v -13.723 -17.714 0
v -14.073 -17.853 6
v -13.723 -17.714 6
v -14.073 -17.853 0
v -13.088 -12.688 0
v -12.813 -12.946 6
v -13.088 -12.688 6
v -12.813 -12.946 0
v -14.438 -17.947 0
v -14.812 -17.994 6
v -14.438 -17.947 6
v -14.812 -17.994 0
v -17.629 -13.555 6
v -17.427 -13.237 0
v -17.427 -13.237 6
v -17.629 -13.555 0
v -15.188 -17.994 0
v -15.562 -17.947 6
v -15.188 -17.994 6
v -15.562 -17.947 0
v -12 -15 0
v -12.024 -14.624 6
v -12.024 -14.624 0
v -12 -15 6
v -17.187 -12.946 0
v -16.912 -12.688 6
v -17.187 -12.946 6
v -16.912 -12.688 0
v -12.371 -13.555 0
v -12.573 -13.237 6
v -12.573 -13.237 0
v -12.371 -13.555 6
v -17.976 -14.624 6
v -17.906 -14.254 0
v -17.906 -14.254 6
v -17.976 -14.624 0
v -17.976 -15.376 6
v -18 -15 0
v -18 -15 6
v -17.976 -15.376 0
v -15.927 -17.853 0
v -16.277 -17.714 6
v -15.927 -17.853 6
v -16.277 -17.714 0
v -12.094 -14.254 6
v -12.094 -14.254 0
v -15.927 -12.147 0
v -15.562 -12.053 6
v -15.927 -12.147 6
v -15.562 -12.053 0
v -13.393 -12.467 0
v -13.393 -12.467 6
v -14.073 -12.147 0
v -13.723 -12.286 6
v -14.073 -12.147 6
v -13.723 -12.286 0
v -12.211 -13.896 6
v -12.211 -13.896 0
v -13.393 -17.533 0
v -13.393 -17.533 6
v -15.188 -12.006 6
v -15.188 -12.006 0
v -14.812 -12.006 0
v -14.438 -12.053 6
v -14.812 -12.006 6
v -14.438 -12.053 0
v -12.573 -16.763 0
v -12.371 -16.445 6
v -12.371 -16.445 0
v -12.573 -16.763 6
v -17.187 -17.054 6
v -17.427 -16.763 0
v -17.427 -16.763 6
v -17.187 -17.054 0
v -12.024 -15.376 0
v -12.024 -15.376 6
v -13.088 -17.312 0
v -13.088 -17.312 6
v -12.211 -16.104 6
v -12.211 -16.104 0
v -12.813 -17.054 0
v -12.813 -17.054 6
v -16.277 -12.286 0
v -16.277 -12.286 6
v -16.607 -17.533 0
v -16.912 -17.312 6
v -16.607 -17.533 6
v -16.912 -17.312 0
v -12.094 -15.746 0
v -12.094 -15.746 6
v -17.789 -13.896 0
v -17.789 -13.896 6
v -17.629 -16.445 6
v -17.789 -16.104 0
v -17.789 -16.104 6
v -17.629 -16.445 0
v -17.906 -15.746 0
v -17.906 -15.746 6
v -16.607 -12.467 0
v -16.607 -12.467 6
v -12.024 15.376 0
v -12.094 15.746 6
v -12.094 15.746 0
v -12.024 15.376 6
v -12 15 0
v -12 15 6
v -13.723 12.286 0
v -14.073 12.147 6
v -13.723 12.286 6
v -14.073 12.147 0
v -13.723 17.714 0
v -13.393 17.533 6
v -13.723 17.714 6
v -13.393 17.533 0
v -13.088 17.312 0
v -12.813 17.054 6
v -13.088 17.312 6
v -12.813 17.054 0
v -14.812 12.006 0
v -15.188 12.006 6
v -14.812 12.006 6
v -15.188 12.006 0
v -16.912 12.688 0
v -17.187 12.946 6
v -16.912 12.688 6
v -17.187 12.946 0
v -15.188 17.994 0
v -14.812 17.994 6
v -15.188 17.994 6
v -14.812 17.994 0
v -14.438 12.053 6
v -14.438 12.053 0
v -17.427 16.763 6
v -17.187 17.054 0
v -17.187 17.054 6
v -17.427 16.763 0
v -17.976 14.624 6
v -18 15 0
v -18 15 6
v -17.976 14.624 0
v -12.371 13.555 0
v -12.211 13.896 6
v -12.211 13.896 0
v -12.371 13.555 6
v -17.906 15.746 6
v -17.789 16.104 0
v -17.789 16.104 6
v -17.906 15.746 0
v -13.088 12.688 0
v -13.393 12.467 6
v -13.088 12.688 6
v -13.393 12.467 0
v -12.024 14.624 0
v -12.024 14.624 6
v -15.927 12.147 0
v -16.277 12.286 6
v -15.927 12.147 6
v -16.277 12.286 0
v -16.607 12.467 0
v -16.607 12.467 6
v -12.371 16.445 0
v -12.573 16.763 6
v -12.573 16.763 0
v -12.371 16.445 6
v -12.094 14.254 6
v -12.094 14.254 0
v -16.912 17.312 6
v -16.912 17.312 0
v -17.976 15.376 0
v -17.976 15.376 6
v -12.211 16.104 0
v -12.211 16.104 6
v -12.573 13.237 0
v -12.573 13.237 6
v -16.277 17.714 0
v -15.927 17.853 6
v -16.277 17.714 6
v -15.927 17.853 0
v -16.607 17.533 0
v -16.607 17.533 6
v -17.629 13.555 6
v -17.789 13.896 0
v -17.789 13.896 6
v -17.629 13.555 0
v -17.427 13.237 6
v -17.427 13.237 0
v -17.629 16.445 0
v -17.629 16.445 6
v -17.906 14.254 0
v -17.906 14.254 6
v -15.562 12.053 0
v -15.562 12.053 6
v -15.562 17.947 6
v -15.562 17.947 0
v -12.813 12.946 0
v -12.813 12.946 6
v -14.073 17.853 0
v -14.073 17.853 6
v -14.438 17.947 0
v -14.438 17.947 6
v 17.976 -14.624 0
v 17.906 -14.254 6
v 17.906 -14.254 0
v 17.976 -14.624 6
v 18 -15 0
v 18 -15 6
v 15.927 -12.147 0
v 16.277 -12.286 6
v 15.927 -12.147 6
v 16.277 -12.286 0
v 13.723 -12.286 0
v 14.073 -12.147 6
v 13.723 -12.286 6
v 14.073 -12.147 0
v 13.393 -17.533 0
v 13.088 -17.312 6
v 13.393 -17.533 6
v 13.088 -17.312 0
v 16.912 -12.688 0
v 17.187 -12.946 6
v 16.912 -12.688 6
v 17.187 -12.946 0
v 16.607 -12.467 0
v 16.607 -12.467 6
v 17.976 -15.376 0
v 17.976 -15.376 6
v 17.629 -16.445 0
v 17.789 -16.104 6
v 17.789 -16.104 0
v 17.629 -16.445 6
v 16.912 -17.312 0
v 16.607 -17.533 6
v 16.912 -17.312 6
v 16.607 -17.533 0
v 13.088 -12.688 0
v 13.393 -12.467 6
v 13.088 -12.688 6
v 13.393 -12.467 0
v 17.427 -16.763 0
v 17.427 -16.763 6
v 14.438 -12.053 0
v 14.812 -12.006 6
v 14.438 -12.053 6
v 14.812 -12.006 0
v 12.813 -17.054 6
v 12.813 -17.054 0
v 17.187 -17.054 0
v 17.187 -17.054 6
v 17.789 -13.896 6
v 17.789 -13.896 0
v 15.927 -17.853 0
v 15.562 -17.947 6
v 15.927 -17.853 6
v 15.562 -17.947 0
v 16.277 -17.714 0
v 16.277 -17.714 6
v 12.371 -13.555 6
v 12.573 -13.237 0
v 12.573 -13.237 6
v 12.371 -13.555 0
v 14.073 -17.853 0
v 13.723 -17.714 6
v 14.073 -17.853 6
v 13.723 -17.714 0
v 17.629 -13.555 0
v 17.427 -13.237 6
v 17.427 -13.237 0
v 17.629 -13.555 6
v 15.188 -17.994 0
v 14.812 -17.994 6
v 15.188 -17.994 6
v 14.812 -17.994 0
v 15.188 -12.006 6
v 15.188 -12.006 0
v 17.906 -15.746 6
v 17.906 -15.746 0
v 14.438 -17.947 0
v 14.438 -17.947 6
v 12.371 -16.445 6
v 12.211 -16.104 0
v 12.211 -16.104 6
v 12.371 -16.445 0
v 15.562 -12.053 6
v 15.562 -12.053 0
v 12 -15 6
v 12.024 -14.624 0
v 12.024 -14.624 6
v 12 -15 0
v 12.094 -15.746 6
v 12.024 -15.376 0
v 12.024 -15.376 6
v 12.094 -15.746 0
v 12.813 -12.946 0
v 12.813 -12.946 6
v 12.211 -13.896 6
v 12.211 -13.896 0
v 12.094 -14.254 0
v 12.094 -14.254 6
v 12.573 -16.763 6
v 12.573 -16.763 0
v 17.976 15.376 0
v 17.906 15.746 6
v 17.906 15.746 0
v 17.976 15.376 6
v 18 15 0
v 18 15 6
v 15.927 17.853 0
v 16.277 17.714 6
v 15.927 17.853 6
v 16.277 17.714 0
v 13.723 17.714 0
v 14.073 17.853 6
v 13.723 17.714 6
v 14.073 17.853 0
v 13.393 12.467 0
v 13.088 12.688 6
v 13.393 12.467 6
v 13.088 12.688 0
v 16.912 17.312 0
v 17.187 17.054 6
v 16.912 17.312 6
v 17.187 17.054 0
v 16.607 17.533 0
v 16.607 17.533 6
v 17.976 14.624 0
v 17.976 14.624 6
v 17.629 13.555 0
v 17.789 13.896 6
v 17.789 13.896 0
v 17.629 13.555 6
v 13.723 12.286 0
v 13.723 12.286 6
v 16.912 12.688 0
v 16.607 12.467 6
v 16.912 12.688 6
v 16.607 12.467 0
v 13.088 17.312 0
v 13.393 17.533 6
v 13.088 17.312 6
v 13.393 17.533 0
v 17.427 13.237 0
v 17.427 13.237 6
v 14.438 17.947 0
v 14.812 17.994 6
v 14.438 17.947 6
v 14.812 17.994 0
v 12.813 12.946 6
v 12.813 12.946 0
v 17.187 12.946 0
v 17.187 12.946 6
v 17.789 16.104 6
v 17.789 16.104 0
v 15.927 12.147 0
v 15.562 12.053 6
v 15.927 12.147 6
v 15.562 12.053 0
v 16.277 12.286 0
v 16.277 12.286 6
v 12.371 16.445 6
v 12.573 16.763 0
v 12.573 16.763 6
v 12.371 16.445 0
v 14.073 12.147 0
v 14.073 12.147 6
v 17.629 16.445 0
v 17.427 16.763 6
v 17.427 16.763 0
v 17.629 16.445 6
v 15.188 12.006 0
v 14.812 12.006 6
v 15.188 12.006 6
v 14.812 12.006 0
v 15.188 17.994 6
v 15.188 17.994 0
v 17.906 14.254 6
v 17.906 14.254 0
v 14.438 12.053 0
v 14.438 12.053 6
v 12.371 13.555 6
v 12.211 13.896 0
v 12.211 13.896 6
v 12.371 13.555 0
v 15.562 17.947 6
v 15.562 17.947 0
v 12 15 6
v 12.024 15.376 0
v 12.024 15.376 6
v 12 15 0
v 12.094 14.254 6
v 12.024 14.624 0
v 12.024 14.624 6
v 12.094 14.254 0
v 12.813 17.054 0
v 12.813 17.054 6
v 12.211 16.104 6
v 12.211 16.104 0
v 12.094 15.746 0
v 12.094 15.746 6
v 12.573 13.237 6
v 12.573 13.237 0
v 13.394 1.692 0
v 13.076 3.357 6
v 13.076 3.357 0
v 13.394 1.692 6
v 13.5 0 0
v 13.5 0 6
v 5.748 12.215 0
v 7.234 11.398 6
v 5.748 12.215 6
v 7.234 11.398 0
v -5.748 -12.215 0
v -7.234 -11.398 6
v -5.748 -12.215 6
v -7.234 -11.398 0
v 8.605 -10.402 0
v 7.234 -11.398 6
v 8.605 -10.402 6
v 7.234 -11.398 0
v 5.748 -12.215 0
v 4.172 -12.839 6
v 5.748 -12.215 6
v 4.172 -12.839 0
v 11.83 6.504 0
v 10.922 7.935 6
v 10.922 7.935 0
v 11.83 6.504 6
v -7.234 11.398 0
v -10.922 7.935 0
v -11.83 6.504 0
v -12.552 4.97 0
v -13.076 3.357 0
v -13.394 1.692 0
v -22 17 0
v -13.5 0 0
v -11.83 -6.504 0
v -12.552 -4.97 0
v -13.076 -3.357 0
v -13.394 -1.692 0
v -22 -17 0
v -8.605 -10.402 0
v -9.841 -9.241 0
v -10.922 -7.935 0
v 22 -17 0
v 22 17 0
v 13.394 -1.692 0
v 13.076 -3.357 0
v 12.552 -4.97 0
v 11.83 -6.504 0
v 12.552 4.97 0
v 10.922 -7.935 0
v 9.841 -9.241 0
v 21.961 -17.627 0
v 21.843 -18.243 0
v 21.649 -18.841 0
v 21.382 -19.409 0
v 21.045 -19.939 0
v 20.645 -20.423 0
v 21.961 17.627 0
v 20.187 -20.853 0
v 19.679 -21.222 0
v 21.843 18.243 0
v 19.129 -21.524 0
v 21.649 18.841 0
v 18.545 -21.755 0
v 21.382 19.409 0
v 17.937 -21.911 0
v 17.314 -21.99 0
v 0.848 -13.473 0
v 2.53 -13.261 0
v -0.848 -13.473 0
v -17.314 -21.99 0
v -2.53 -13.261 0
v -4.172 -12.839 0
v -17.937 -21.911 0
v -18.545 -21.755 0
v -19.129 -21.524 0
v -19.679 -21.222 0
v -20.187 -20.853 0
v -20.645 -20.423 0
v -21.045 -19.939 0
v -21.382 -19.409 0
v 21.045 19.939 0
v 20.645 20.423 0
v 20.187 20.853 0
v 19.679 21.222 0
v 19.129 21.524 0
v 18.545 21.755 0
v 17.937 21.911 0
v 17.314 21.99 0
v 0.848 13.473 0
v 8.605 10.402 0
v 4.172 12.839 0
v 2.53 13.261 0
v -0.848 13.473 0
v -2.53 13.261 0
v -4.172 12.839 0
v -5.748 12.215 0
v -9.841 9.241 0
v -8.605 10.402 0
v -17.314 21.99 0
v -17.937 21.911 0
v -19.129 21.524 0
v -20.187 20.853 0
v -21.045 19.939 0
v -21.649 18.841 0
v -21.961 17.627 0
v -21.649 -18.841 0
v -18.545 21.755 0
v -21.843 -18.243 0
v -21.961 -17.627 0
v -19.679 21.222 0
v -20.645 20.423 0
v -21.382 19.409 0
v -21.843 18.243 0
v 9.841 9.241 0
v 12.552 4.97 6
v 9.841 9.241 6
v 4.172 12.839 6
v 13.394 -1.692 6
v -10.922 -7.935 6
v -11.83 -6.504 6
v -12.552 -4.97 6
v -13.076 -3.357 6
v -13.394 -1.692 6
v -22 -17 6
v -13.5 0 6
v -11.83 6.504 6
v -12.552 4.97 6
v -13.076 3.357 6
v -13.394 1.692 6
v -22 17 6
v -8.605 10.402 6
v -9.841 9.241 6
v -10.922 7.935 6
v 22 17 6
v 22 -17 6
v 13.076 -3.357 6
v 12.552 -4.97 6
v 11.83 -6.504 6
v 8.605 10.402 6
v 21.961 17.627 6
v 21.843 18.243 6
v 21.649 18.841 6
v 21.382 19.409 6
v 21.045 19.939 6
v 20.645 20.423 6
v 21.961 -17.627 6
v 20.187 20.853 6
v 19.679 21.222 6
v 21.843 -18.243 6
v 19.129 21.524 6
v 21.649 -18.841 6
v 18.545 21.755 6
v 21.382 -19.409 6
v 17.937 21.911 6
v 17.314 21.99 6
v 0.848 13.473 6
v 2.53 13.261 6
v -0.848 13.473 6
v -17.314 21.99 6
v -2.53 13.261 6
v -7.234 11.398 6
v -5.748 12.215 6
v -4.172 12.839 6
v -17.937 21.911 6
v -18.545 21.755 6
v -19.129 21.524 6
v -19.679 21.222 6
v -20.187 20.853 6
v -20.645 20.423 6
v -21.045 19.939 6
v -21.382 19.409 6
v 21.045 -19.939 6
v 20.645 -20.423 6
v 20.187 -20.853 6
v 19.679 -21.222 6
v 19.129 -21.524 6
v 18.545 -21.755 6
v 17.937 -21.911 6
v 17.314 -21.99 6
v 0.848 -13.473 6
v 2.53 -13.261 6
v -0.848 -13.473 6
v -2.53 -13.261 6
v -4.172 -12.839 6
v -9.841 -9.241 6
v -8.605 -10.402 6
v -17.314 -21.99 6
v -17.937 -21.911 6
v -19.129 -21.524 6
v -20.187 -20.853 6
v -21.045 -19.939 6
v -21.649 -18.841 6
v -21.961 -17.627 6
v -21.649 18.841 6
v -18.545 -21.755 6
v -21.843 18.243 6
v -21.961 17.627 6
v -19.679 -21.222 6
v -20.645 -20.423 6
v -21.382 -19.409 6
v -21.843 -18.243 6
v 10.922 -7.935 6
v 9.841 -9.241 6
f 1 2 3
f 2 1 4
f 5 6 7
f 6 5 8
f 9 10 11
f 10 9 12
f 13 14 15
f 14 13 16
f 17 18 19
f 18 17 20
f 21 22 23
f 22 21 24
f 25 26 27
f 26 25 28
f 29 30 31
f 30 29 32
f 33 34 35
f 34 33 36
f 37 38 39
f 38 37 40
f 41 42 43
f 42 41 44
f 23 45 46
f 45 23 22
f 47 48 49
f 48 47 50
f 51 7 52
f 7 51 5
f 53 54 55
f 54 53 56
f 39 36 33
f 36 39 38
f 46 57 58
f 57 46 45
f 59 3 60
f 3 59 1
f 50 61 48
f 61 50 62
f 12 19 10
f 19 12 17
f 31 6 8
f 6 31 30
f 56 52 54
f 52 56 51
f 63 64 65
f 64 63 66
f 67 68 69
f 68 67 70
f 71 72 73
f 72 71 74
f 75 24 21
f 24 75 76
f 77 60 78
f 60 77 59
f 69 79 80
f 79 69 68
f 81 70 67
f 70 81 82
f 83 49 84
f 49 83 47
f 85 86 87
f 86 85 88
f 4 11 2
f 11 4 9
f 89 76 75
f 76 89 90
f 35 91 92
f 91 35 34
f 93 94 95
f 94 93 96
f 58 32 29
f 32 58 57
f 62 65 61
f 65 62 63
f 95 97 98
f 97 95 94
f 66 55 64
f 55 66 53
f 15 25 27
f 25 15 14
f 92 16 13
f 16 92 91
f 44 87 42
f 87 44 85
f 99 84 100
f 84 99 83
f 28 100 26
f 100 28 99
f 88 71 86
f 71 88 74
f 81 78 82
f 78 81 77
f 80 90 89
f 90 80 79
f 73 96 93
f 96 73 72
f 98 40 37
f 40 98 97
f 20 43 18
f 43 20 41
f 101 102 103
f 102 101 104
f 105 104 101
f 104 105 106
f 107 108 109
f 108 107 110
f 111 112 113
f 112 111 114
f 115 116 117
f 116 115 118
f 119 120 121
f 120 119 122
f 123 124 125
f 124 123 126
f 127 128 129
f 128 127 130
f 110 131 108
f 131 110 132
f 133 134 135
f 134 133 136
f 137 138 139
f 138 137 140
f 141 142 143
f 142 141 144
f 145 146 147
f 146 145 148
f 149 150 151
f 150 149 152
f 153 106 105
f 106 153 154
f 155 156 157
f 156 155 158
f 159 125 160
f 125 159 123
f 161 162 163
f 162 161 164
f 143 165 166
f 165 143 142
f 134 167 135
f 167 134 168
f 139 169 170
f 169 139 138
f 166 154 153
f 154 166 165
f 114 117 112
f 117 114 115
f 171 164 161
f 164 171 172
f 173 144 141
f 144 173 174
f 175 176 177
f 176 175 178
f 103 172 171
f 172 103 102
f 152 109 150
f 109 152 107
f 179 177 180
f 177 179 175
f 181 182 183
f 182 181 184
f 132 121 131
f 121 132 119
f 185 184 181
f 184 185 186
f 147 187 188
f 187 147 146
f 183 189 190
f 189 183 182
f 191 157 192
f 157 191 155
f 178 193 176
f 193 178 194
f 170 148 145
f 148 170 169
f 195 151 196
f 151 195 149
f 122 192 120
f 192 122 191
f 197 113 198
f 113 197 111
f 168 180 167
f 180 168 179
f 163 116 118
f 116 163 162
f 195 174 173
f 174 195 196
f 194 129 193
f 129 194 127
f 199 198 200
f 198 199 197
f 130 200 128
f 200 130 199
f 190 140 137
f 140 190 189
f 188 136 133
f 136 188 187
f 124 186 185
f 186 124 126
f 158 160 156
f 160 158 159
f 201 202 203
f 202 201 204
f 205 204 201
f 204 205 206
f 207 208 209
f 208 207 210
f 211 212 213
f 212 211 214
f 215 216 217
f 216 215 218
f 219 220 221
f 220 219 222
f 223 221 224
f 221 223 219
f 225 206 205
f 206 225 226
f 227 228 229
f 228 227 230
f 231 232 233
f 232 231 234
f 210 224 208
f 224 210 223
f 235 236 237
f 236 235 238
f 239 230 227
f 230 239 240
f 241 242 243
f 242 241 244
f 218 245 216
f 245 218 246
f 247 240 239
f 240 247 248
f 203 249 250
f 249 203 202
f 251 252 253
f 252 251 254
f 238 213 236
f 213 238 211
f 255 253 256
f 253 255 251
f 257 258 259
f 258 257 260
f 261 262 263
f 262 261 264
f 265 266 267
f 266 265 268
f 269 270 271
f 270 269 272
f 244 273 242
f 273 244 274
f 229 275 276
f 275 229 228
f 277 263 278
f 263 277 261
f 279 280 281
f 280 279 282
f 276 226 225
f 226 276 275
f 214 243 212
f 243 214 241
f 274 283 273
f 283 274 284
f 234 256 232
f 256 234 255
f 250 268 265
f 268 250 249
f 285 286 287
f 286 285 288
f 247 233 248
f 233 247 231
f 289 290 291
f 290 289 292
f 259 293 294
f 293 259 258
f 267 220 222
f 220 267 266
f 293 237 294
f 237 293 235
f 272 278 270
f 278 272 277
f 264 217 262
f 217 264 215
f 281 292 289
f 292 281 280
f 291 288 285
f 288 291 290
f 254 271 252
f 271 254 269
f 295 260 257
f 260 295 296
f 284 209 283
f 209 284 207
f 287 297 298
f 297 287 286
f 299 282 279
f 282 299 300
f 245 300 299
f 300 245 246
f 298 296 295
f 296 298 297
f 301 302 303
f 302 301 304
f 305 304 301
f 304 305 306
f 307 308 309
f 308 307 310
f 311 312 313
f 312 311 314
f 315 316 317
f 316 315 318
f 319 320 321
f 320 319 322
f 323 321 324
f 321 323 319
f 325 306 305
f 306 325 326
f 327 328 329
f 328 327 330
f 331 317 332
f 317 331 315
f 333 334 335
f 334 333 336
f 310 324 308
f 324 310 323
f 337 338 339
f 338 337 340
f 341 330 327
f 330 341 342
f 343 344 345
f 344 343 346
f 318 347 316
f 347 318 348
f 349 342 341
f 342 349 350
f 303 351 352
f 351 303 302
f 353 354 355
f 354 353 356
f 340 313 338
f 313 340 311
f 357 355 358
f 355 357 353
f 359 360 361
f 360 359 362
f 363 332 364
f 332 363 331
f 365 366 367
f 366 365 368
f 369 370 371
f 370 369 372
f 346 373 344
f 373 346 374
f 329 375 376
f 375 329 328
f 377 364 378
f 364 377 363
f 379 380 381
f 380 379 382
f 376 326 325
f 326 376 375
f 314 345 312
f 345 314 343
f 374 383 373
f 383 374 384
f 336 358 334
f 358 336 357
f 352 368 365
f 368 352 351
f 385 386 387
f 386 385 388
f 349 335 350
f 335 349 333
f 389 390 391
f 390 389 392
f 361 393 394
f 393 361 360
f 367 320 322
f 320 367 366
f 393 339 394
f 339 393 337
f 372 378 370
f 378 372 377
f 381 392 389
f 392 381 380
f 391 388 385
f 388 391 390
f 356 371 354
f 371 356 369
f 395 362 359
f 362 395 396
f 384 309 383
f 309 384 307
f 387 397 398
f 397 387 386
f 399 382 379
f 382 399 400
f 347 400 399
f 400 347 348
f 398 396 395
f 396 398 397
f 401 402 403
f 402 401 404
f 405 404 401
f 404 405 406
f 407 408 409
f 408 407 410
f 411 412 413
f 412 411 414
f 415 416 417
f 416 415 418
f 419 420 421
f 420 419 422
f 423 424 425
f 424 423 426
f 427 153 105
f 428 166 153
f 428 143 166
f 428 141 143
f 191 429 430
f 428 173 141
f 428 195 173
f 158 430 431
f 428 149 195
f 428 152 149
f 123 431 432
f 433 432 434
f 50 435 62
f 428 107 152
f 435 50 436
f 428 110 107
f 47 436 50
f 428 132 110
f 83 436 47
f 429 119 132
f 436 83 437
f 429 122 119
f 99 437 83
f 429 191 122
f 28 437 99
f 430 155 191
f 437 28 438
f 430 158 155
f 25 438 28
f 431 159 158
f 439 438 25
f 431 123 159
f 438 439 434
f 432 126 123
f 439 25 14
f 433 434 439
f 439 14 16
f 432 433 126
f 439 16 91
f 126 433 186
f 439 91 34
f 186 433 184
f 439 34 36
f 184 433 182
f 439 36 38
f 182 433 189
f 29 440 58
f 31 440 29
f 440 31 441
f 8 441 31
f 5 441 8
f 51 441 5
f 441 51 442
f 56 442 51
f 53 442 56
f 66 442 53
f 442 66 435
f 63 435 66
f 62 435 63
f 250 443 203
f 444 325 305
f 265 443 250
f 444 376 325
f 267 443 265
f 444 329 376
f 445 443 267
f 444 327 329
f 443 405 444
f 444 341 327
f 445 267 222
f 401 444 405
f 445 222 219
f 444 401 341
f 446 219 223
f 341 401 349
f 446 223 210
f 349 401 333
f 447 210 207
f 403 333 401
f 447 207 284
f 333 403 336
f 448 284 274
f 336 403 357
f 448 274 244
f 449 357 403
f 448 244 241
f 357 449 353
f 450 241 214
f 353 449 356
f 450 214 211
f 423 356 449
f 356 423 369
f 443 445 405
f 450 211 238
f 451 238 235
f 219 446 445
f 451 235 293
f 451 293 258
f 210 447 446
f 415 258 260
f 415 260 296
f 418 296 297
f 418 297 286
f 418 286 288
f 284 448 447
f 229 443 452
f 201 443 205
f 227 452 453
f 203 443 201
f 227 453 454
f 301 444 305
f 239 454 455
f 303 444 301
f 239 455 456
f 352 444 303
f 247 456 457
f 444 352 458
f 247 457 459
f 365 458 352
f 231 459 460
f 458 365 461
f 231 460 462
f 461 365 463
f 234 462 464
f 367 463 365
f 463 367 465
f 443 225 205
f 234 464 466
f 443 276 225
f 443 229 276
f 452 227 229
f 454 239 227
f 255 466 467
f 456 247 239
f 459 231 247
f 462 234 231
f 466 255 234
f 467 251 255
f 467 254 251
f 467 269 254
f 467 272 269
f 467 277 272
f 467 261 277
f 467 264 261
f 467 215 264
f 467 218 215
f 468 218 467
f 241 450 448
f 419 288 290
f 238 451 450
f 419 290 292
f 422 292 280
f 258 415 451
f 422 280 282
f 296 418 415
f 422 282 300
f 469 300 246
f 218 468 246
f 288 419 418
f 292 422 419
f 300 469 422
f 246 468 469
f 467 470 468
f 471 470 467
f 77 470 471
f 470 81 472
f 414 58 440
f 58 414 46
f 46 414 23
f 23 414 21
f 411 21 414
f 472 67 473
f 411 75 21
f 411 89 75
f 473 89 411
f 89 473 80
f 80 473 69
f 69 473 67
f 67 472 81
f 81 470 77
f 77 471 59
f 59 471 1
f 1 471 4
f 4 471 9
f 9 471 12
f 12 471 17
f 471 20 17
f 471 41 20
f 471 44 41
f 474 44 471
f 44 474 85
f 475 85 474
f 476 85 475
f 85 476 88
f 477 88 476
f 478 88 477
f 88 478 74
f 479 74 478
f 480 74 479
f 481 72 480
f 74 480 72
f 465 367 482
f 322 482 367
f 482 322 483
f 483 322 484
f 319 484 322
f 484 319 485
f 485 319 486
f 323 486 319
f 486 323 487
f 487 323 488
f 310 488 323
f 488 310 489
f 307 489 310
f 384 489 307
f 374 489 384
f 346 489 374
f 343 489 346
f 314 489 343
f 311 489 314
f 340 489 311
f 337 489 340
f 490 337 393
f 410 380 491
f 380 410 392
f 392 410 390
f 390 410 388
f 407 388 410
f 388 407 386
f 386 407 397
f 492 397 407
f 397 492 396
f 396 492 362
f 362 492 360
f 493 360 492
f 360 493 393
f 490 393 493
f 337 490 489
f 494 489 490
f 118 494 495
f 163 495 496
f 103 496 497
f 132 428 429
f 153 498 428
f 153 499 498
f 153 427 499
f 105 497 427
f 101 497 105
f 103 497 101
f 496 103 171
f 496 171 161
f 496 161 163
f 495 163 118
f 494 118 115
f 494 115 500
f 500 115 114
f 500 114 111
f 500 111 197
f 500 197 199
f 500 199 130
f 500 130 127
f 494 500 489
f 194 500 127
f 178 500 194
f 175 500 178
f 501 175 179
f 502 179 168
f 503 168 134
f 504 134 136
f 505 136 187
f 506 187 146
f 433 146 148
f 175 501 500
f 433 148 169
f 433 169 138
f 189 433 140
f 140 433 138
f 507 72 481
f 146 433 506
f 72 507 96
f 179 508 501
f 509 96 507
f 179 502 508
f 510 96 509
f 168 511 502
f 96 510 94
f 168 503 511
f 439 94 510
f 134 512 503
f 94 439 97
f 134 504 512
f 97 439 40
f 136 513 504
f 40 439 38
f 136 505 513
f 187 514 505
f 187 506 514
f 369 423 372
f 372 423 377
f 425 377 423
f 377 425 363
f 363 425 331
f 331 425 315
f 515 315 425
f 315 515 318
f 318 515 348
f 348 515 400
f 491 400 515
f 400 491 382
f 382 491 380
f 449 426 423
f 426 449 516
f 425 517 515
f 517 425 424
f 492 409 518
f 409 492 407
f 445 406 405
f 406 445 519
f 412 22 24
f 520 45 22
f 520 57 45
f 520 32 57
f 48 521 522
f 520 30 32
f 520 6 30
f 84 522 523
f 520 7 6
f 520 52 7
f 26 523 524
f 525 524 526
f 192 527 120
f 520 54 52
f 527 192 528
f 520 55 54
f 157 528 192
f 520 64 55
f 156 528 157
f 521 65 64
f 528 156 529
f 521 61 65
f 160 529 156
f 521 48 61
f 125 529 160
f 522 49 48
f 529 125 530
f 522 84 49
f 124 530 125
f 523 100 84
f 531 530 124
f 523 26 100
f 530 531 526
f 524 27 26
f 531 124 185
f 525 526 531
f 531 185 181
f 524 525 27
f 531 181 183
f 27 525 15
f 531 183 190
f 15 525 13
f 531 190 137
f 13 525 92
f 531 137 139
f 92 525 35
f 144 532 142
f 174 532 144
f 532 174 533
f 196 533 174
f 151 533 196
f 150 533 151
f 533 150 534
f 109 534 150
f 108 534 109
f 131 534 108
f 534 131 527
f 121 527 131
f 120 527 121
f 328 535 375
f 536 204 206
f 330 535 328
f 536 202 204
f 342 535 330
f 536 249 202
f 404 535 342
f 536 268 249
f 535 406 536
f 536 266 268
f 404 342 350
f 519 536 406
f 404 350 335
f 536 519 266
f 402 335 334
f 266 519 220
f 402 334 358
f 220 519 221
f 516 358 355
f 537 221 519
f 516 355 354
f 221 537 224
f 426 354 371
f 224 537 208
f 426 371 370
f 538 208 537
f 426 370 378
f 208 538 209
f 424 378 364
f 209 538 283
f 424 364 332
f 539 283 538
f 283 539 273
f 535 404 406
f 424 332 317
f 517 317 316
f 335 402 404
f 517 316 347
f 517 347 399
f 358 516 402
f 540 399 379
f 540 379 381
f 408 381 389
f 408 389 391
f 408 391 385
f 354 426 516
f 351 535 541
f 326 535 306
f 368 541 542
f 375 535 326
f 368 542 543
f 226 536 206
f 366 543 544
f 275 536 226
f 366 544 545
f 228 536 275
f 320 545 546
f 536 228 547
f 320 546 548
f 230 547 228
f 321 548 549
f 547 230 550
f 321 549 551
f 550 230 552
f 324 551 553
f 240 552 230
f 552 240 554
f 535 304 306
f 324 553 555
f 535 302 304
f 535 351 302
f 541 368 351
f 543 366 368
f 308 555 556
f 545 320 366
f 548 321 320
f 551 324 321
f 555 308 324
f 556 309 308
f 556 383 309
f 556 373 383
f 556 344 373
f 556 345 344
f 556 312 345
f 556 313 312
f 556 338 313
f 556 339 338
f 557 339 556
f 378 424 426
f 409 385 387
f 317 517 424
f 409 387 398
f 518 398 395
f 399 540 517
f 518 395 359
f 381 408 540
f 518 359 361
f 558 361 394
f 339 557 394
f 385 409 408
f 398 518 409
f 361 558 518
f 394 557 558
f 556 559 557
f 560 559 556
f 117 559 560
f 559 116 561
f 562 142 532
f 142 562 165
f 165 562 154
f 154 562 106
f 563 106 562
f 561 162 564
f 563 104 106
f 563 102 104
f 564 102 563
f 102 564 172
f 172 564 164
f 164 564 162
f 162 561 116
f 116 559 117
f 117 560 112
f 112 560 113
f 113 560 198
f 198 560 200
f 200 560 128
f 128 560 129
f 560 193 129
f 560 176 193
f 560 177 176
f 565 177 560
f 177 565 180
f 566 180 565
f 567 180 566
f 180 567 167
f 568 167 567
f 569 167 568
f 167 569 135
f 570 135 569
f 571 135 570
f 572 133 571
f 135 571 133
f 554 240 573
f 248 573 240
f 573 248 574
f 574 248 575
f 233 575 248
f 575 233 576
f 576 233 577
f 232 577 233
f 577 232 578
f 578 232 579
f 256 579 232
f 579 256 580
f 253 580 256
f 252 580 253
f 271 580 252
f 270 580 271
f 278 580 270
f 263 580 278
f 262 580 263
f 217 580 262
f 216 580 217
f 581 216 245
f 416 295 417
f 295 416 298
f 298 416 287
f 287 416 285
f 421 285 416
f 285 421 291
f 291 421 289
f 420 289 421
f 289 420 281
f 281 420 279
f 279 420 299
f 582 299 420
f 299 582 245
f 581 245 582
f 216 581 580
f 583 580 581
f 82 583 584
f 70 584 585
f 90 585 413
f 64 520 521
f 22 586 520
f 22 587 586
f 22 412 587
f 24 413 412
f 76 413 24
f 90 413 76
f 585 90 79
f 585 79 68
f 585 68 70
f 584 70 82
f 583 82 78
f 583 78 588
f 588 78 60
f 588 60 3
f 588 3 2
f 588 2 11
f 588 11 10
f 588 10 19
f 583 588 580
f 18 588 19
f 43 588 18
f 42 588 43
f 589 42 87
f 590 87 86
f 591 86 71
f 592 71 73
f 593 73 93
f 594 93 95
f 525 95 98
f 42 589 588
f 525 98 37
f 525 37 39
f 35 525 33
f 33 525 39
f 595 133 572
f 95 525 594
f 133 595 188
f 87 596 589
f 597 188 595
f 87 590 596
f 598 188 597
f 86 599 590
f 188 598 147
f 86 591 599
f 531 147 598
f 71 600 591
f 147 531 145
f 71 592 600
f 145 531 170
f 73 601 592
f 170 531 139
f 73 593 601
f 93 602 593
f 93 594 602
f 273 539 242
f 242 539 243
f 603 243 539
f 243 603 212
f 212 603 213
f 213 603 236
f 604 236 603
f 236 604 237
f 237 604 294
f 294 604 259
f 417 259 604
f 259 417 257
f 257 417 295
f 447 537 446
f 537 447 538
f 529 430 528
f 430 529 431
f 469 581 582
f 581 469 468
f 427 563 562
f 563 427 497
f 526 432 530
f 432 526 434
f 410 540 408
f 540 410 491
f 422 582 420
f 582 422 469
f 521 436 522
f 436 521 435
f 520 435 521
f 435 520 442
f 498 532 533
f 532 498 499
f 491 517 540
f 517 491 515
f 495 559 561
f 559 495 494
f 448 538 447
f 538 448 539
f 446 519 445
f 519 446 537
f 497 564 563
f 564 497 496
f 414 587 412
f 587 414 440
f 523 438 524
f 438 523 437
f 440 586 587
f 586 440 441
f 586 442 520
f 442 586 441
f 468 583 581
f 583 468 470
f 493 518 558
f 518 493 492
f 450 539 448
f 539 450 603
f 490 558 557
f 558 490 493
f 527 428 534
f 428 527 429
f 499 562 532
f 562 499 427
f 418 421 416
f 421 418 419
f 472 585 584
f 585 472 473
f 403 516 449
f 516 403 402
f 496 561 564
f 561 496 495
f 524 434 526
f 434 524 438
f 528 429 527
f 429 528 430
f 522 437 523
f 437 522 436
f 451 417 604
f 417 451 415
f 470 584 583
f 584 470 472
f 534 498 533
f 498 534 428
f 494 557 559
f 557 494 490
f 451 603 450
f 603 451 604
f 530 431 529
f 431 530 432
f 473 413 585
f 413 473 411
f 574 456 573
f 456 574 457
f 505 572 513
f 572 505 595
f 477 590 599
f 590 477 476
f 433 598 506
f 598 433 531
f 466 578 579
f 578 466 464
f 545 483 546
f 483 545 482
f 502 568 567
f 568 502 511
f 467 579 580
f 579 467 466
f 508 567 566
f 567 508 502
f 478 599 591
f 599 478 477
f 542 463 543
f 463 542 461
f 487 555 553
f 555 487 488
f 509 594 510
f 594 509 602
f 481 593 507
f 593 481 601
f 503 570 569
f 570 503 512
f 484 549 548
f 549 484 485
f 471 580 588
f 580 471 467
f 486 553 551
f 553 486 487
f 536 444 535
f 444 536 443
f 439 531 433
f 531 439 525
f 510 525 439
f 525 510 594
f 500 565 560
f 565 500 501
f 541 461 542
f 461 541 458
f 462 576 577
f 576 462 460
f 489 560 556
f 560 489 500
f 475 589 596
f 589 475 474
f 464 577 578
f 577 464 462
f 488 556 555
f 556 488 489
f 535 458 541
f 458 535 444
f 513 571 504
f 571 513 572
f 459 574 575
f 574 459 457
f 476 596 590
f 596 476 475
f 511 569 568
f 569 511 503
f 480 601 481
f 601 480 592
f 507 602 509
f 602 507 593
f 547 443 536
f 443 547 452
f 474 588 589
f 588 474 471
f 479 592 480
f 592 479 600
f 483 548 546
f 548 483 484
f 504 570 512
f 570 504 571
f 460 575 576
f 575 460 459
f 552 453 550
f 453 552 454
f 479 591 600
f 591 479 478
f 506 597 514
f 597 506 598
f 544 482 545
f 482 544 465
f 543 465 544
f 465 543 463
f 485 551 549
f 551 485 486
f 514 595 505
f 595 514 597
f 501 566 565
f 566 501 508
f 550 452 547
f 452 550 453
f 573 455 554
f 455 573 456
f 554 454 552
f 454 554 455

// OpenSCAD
$fn = 50;


difference() {
	union() {
		hull() {
			translate(v = [-17.0000000000, 17.0000000000, 0]) {
				cylinder(h = 6, r = 5);
			}
			translate(v = [17.0000000000, 17.0000000000, 0]) {
				cylinder(h = 6, r = 5);
			}
			translate(v = [-17.0000000000, -17.0000000000, 0]) {
				cylinder(h = 6, r = 5);
			}
			translate(v = [17.0000000000, -17.0000000000, 0]) {
				cylinder(h = 6, r = 5);
			}
		}
	}
	union() {
		#translate(v = [-15.0000000000, -15.0000000000, -100.0000000000]) {
			cylinder(h = 200, r = 3.0000000000);
		}
		#translate(v = [-15.0000000000, 15.0000000000, -100.0000000000]) {
			cylinder(h = 200, r = 3.0000000000);
		}
		#translate(v = [15.0000000000, -15.0000000000, -100.0000000000]) {
			cylinder(h = 200, r = 3.0000000000);
		}
		#translate(v = [15.0000000000, 15.0000000000, -100.0000000000]) {
			cylinder(h = 200, r = 3.0000000000);
		}
		#cylinder(h = 6, r = 13.5000000000);
	}
}
